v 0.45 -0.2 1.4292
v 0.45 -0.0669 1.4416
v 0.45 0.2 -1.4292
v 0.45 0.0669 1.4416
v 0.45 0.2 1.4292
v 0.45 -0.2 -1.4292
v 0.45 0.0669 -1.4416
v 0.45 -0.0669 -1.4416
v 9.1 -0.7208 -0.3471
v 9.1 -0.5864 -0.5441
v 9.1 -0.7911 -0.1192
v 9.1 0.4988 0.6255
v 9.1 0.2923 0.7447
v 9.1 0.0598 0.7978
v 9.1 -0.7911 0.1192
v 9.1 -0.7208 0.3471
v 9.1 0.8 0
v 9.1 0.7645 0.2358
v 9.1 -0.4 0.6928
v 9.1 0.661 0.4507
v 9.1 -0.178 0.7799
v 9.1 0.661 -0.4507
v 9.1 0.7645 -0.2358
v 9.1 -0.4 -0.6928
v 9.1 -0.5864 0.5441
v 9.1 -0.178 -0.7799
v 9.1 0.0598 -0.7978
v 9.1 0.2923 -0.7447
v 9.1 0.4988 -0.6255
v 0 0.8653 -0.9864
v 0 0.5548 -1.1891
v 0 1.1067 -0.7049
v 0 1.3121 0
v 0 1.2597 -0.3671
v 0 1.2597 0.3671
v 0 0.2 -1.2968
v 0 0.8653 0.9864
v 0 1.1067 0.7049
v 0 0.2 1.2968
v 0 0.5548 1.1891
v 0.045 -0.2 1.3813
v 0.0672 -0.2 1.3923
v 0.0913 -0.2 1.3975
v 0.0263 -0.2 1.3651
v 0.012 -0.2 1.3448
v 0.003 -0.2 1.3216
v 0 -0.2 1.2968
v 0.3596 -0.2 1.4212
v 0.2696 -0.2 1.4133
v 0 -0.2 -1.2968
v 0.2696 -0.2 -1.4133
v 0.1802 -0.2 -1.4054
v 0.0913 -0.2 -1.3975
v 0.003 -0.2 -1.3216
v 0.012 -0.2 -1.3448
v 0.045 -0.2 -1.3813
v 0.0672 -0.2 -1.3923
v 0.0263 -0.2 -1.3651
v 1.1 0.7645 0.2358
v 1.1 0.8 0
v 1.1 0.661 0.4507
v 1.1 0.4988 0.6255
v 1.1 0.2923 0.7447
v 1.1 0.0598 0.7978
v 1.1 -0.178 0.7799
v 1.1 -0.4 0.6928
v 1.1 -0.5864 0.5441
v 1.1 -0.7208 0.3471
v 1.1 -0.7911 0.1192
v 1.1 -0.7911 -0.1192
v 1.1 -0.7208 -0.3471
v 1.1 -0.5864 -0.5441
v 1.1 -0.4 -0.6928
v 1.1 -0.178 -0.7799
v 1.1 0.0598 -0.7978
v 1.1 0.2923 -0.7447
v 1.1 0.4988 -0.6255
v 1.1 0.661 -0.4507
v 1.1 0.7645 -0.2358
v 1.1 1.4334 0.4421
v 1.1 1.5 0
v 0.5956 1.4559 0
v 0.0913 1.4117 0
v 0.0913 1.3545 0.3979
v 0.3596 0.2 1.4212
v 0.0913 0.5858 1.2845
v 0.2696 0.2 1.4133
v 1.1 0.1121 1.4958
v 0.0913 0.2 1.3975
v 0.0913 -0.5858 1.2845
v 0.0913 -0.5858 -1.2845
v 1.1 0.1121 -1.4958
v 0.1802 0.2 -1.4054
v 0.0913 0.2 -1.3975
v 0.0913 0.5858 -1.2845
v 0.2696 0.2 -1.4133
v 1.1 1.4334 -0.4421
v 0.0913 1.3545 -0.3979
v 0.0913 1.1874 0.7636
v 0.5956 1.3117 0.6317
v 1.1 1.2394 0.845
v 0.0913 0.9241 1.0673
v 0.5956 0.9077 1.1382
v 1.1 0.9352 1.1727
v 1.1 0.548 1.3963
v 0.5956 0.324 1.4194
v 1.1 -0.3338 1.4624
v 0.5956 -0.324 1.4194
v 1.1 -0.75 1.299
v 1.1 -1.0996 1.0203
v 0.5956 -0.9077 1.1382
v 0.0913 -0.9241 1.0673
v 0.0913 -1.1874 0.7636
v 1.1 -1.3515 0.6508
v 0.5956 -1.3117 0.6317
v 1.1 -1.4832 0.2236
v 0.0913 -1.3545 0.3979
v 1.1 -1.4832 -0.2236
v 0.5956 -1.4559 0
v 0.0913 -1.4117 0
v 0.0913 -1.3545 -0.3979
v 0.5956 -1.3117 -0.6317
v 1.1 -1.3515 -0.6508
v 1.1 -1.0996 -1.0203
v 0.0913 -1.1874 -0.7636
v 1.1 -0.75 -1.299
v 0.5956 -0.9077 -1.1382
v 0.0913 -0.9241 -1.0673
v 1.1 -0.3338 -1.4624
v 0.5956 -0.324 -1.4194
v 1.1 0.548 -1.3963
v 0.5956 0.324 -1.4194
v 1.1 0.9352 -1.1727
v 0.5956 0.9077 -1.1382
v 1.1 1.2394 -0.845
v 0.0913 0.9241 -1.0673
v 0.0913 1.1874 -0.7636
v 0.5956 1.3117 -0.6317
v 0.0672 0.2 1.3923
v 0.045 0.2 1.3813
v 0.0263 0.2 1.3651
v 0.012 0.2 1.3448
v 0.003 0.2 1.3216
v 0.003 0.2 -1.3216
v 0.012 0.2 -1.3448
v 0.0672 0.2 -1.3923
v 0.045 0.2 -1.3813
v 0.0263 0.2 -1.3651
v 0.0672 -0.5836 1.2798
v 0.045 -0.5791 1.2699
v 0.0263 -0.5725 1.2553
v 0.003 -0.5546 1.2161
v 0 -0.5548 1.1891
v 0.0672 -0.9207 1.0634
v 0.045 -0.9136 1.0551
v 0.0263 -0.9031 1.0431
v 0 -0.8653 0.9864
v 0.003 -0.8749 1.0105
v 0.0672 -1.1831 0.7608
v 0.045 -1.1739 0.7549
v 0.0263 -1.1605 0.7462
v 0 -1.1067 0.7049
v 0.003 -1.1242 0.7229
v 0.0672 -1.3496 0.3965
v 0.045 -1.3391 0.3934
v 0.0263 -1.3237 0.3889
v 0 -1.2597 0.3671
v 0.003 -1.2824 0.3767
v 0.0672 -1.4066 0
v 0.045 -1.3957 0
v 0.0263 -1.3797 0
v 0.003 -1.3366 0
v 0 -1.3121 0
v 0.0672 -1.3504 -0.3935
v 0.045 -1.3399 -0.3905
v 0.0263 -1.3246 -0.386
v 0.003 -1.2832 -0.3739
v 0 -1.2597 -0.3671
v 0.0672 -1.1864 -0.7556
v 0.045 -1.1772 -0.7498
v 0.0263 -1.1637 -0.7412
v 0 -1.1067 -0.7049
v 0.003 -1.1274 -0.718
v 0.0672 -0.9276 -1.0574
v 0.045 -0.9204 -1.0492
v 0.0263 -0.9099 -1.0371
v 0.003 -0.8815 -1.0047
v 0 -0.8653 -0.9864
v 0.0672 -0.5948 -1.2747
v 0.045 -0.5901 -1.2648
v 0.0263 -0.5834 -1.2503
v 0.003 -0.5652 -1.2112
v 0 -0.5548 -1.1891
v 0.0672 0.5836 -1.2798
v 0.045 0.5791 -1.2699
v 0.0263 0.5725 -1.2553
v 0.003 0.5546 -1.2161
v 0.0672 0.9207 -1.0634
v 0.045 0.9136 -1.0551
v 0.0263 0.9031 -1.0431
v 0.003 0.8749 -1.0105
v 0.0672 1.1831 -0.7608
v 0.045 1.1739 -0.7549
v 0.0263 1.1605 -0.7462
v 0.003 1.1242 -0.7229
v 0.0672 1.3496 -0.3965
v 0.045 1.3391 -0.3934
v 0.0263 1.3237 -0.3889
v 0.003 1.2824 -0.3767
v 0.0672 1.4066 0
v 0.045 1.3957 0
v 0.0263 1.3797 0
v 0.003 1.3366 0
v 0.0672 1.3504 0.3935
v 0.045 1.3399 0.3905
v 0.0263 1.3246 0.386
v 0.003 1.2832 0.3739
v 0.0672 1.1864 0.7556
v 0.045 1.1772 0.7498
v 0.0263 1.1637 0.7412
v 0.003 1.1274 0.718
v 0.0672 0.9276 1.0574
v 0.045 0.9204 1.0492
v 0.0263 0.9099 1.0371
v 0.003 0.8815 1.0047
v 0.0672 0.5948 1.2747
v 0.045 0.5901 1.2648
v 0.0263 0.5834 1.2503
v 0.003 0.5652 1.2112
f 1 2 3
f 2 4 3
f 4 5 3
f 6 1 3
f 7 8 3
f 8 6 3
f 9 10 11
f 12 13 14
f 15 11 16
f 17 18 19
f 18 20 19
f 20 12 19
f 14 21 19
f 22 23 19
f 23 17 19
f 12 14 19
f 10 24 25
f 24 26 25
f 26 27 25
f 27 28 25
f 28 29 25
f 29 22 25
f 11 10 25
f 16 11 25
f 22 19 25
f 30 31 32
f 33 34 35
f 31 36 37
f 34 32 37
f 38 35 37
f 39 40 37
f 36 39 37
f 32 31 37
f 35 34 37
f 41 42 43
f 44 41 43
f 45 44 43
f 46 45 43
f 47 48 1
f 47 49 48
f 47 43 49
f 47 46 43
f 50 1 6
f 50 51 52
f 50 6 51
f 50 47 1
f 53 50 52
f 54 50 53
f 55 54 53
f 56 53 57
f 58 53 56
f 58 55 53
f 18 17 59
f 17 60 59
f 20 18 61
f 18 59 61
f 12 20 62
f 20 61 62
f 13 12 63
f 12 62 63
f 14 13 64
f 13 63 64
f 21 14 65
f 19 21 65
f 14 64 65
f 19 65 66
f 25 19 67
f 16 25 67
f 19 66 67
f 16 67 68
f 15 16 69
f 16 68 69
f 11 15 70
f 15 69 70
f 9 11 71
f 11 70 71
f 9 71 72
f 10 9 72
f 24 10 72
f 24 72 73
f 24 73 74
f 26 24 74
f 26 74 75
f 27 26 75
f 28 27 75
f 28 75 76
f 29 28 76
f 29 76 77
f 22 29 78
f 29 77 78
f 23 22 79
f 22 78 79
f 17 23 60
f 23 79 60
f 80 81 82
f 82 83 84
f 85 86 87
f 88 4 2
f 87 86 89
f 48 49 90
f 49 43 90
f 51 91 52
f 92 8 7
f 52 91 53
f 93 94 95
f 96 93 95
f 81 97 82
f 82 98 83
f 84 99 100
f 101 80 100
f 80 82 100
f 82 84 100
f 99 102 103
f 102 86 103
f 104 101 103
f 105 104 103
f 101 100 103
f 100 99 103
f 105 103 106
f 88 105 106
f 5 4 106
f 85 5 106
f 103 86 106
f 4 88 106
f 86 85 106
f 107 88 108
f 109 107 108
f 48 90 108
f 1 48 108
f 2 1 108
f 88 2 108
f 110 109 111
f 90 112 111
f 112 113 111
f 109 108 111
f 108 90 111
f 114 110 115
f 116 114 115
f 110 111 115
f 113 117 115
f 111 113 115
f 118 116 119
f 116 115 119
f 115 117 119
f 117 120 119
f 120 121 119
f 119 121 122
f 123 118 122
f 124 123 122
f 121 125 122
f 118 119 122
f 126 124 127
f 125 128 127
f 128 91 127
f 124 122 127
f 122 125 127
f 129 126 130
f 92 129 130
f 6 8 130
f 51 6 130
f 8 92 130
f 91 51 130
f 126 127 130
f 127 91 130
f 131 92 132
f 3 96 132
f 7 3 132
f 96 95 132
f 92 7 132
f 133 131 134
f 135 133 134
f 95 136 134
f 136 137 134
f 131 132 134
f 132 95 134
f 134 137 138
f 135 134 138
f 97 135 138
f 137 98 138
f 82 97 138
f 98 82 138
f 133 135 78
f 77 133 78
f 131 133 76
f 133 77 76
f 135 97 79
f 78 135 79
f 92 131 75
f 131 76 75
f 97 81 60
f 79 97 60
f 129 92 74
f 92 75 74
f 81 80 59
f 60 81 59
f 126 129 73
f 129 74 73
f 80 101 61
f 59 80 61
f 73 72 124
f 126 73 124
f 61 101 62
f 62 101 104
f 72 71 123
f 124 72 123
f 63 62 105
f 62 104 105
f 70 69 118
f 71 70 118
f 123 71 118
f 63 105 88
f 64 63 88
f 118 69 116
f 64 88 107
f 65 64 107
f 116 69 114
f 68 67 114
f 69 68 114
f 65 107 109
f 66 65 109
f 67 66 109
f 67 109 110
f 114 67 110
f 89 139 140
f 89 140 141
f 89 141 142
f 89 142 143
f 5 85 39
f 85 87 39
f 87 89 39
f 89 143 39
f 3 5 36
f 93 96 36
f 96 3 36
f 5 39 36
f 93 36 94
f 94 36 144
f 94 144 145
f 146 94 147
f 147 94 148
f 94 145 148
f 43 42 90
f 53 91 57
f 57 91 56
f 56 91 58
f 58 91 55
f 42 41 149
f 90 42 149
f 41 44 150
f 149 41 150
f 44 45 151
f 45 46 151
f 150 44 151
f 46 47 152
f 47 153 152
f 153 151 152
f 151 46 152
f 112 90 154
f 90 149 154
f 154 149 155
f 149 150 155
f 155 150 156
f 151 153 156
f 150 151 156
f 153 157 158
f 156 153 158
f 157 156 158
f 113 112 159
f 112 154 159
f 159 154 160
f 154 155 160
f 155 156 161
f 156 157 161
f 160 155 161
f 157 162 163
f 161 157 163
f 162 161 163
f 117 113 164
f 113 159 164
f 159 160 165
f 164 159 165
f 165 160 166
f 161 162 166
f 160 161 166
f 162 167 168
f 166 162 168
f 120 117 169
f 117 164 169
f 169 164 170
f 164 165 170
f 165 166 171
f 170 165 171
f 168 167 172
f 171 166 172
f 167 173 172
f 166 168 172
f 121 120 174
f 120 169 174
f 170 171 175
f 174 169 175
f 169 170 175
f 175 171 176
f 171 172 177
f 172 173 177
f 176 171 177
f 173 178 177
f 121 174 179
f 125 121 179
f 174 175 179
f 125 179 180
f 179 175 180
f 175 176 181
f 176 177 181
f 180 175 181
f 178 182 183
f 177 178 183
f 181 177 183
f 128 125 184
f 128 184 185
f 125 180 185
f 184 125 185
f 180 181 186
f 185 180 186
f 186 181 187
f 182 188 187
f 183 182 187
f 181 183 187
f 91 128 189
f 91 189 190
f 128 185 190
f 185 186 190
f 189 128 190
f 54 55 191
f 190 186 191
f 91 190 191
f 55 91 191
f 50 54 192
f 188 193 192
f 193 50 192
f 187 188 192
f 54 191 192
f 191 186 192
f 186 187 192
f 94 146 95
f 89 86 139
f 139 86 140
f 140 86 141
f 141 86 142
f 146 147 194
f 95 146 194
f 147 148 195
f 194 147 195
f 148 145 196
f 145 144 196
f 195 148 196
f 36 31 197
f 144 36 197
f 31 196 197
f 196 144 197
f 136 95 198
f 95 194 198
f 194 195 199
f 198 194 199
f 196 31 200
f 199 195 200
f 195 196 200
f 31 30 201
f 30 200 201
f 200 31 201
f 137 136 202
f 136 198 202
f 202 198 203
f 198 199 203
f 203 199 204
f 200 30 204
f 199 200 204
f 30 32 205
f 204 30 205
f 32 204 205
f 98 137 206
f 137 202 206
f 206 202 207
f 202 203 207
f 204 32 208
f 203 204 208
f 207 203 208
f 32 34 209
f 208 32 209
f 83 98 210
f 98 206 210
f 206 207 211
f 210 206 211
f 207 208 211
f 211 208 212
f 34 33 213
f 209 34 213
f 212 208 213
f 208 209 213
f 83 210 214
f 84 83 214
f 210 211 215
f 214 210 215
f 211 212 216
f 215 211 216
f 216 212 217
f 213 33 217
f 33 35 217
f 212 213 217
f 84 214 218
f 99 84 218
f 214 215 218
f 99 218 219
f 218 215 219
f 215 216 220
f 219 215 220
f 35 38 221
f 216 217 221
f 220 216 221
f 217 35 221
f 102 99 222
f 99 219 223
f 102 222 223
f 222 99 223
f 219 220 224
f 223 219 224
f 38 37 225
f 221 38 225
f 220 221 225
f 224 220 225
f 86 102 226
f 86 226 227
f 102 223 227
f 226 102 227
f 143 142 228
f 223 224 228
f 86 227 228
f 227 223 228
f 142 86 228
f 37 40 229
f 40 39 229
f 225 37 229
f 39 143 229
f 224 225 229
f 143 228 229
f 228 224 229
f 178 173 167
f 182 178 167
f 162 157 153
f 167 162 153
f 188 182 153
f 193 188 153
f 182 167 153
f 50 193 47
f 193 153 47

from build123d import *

# Parameters (mm, degrees)
FILLET2_R  = 0.1
SKETCH2_W  = 3
SKETCH2_H  = 0.4
SLOT_DEPTH = 0.45


with BuildPart() as part:
    # BodySke → Base-Revolve (revolve)
    with BuildSketch(Plane.XY):
        Polygon((1.1, 0.8), (1.1, 1.5), (0, 1.40376247), (0, 0), (9.1, 0), (9.1, 0.8), align=None)
    revolve(axis=Axis((-25.4, 0, 0), (1, 0, 0)))

    # Fillet2
    fillet2_edges = [part.edges().sort_by_distance(p)[0] for p in [
        (0, -1.40376247, 0),
    ]]
    fillet(fillet2_edges, radius=FILLET2_R)

    # Sketch2 → Slot (cut)
    with BuildSketch(Plane(origin=(0, 0, 0), x_dir=(0, 0, -1), z_dir=(1, 0, 0))):
        Rectangle(SKETCH2_W, SKETCH2_H)
    extrude(amount=SLOT_DEPTH, mode=Mode.SUBTRACT)


solid = part.part
